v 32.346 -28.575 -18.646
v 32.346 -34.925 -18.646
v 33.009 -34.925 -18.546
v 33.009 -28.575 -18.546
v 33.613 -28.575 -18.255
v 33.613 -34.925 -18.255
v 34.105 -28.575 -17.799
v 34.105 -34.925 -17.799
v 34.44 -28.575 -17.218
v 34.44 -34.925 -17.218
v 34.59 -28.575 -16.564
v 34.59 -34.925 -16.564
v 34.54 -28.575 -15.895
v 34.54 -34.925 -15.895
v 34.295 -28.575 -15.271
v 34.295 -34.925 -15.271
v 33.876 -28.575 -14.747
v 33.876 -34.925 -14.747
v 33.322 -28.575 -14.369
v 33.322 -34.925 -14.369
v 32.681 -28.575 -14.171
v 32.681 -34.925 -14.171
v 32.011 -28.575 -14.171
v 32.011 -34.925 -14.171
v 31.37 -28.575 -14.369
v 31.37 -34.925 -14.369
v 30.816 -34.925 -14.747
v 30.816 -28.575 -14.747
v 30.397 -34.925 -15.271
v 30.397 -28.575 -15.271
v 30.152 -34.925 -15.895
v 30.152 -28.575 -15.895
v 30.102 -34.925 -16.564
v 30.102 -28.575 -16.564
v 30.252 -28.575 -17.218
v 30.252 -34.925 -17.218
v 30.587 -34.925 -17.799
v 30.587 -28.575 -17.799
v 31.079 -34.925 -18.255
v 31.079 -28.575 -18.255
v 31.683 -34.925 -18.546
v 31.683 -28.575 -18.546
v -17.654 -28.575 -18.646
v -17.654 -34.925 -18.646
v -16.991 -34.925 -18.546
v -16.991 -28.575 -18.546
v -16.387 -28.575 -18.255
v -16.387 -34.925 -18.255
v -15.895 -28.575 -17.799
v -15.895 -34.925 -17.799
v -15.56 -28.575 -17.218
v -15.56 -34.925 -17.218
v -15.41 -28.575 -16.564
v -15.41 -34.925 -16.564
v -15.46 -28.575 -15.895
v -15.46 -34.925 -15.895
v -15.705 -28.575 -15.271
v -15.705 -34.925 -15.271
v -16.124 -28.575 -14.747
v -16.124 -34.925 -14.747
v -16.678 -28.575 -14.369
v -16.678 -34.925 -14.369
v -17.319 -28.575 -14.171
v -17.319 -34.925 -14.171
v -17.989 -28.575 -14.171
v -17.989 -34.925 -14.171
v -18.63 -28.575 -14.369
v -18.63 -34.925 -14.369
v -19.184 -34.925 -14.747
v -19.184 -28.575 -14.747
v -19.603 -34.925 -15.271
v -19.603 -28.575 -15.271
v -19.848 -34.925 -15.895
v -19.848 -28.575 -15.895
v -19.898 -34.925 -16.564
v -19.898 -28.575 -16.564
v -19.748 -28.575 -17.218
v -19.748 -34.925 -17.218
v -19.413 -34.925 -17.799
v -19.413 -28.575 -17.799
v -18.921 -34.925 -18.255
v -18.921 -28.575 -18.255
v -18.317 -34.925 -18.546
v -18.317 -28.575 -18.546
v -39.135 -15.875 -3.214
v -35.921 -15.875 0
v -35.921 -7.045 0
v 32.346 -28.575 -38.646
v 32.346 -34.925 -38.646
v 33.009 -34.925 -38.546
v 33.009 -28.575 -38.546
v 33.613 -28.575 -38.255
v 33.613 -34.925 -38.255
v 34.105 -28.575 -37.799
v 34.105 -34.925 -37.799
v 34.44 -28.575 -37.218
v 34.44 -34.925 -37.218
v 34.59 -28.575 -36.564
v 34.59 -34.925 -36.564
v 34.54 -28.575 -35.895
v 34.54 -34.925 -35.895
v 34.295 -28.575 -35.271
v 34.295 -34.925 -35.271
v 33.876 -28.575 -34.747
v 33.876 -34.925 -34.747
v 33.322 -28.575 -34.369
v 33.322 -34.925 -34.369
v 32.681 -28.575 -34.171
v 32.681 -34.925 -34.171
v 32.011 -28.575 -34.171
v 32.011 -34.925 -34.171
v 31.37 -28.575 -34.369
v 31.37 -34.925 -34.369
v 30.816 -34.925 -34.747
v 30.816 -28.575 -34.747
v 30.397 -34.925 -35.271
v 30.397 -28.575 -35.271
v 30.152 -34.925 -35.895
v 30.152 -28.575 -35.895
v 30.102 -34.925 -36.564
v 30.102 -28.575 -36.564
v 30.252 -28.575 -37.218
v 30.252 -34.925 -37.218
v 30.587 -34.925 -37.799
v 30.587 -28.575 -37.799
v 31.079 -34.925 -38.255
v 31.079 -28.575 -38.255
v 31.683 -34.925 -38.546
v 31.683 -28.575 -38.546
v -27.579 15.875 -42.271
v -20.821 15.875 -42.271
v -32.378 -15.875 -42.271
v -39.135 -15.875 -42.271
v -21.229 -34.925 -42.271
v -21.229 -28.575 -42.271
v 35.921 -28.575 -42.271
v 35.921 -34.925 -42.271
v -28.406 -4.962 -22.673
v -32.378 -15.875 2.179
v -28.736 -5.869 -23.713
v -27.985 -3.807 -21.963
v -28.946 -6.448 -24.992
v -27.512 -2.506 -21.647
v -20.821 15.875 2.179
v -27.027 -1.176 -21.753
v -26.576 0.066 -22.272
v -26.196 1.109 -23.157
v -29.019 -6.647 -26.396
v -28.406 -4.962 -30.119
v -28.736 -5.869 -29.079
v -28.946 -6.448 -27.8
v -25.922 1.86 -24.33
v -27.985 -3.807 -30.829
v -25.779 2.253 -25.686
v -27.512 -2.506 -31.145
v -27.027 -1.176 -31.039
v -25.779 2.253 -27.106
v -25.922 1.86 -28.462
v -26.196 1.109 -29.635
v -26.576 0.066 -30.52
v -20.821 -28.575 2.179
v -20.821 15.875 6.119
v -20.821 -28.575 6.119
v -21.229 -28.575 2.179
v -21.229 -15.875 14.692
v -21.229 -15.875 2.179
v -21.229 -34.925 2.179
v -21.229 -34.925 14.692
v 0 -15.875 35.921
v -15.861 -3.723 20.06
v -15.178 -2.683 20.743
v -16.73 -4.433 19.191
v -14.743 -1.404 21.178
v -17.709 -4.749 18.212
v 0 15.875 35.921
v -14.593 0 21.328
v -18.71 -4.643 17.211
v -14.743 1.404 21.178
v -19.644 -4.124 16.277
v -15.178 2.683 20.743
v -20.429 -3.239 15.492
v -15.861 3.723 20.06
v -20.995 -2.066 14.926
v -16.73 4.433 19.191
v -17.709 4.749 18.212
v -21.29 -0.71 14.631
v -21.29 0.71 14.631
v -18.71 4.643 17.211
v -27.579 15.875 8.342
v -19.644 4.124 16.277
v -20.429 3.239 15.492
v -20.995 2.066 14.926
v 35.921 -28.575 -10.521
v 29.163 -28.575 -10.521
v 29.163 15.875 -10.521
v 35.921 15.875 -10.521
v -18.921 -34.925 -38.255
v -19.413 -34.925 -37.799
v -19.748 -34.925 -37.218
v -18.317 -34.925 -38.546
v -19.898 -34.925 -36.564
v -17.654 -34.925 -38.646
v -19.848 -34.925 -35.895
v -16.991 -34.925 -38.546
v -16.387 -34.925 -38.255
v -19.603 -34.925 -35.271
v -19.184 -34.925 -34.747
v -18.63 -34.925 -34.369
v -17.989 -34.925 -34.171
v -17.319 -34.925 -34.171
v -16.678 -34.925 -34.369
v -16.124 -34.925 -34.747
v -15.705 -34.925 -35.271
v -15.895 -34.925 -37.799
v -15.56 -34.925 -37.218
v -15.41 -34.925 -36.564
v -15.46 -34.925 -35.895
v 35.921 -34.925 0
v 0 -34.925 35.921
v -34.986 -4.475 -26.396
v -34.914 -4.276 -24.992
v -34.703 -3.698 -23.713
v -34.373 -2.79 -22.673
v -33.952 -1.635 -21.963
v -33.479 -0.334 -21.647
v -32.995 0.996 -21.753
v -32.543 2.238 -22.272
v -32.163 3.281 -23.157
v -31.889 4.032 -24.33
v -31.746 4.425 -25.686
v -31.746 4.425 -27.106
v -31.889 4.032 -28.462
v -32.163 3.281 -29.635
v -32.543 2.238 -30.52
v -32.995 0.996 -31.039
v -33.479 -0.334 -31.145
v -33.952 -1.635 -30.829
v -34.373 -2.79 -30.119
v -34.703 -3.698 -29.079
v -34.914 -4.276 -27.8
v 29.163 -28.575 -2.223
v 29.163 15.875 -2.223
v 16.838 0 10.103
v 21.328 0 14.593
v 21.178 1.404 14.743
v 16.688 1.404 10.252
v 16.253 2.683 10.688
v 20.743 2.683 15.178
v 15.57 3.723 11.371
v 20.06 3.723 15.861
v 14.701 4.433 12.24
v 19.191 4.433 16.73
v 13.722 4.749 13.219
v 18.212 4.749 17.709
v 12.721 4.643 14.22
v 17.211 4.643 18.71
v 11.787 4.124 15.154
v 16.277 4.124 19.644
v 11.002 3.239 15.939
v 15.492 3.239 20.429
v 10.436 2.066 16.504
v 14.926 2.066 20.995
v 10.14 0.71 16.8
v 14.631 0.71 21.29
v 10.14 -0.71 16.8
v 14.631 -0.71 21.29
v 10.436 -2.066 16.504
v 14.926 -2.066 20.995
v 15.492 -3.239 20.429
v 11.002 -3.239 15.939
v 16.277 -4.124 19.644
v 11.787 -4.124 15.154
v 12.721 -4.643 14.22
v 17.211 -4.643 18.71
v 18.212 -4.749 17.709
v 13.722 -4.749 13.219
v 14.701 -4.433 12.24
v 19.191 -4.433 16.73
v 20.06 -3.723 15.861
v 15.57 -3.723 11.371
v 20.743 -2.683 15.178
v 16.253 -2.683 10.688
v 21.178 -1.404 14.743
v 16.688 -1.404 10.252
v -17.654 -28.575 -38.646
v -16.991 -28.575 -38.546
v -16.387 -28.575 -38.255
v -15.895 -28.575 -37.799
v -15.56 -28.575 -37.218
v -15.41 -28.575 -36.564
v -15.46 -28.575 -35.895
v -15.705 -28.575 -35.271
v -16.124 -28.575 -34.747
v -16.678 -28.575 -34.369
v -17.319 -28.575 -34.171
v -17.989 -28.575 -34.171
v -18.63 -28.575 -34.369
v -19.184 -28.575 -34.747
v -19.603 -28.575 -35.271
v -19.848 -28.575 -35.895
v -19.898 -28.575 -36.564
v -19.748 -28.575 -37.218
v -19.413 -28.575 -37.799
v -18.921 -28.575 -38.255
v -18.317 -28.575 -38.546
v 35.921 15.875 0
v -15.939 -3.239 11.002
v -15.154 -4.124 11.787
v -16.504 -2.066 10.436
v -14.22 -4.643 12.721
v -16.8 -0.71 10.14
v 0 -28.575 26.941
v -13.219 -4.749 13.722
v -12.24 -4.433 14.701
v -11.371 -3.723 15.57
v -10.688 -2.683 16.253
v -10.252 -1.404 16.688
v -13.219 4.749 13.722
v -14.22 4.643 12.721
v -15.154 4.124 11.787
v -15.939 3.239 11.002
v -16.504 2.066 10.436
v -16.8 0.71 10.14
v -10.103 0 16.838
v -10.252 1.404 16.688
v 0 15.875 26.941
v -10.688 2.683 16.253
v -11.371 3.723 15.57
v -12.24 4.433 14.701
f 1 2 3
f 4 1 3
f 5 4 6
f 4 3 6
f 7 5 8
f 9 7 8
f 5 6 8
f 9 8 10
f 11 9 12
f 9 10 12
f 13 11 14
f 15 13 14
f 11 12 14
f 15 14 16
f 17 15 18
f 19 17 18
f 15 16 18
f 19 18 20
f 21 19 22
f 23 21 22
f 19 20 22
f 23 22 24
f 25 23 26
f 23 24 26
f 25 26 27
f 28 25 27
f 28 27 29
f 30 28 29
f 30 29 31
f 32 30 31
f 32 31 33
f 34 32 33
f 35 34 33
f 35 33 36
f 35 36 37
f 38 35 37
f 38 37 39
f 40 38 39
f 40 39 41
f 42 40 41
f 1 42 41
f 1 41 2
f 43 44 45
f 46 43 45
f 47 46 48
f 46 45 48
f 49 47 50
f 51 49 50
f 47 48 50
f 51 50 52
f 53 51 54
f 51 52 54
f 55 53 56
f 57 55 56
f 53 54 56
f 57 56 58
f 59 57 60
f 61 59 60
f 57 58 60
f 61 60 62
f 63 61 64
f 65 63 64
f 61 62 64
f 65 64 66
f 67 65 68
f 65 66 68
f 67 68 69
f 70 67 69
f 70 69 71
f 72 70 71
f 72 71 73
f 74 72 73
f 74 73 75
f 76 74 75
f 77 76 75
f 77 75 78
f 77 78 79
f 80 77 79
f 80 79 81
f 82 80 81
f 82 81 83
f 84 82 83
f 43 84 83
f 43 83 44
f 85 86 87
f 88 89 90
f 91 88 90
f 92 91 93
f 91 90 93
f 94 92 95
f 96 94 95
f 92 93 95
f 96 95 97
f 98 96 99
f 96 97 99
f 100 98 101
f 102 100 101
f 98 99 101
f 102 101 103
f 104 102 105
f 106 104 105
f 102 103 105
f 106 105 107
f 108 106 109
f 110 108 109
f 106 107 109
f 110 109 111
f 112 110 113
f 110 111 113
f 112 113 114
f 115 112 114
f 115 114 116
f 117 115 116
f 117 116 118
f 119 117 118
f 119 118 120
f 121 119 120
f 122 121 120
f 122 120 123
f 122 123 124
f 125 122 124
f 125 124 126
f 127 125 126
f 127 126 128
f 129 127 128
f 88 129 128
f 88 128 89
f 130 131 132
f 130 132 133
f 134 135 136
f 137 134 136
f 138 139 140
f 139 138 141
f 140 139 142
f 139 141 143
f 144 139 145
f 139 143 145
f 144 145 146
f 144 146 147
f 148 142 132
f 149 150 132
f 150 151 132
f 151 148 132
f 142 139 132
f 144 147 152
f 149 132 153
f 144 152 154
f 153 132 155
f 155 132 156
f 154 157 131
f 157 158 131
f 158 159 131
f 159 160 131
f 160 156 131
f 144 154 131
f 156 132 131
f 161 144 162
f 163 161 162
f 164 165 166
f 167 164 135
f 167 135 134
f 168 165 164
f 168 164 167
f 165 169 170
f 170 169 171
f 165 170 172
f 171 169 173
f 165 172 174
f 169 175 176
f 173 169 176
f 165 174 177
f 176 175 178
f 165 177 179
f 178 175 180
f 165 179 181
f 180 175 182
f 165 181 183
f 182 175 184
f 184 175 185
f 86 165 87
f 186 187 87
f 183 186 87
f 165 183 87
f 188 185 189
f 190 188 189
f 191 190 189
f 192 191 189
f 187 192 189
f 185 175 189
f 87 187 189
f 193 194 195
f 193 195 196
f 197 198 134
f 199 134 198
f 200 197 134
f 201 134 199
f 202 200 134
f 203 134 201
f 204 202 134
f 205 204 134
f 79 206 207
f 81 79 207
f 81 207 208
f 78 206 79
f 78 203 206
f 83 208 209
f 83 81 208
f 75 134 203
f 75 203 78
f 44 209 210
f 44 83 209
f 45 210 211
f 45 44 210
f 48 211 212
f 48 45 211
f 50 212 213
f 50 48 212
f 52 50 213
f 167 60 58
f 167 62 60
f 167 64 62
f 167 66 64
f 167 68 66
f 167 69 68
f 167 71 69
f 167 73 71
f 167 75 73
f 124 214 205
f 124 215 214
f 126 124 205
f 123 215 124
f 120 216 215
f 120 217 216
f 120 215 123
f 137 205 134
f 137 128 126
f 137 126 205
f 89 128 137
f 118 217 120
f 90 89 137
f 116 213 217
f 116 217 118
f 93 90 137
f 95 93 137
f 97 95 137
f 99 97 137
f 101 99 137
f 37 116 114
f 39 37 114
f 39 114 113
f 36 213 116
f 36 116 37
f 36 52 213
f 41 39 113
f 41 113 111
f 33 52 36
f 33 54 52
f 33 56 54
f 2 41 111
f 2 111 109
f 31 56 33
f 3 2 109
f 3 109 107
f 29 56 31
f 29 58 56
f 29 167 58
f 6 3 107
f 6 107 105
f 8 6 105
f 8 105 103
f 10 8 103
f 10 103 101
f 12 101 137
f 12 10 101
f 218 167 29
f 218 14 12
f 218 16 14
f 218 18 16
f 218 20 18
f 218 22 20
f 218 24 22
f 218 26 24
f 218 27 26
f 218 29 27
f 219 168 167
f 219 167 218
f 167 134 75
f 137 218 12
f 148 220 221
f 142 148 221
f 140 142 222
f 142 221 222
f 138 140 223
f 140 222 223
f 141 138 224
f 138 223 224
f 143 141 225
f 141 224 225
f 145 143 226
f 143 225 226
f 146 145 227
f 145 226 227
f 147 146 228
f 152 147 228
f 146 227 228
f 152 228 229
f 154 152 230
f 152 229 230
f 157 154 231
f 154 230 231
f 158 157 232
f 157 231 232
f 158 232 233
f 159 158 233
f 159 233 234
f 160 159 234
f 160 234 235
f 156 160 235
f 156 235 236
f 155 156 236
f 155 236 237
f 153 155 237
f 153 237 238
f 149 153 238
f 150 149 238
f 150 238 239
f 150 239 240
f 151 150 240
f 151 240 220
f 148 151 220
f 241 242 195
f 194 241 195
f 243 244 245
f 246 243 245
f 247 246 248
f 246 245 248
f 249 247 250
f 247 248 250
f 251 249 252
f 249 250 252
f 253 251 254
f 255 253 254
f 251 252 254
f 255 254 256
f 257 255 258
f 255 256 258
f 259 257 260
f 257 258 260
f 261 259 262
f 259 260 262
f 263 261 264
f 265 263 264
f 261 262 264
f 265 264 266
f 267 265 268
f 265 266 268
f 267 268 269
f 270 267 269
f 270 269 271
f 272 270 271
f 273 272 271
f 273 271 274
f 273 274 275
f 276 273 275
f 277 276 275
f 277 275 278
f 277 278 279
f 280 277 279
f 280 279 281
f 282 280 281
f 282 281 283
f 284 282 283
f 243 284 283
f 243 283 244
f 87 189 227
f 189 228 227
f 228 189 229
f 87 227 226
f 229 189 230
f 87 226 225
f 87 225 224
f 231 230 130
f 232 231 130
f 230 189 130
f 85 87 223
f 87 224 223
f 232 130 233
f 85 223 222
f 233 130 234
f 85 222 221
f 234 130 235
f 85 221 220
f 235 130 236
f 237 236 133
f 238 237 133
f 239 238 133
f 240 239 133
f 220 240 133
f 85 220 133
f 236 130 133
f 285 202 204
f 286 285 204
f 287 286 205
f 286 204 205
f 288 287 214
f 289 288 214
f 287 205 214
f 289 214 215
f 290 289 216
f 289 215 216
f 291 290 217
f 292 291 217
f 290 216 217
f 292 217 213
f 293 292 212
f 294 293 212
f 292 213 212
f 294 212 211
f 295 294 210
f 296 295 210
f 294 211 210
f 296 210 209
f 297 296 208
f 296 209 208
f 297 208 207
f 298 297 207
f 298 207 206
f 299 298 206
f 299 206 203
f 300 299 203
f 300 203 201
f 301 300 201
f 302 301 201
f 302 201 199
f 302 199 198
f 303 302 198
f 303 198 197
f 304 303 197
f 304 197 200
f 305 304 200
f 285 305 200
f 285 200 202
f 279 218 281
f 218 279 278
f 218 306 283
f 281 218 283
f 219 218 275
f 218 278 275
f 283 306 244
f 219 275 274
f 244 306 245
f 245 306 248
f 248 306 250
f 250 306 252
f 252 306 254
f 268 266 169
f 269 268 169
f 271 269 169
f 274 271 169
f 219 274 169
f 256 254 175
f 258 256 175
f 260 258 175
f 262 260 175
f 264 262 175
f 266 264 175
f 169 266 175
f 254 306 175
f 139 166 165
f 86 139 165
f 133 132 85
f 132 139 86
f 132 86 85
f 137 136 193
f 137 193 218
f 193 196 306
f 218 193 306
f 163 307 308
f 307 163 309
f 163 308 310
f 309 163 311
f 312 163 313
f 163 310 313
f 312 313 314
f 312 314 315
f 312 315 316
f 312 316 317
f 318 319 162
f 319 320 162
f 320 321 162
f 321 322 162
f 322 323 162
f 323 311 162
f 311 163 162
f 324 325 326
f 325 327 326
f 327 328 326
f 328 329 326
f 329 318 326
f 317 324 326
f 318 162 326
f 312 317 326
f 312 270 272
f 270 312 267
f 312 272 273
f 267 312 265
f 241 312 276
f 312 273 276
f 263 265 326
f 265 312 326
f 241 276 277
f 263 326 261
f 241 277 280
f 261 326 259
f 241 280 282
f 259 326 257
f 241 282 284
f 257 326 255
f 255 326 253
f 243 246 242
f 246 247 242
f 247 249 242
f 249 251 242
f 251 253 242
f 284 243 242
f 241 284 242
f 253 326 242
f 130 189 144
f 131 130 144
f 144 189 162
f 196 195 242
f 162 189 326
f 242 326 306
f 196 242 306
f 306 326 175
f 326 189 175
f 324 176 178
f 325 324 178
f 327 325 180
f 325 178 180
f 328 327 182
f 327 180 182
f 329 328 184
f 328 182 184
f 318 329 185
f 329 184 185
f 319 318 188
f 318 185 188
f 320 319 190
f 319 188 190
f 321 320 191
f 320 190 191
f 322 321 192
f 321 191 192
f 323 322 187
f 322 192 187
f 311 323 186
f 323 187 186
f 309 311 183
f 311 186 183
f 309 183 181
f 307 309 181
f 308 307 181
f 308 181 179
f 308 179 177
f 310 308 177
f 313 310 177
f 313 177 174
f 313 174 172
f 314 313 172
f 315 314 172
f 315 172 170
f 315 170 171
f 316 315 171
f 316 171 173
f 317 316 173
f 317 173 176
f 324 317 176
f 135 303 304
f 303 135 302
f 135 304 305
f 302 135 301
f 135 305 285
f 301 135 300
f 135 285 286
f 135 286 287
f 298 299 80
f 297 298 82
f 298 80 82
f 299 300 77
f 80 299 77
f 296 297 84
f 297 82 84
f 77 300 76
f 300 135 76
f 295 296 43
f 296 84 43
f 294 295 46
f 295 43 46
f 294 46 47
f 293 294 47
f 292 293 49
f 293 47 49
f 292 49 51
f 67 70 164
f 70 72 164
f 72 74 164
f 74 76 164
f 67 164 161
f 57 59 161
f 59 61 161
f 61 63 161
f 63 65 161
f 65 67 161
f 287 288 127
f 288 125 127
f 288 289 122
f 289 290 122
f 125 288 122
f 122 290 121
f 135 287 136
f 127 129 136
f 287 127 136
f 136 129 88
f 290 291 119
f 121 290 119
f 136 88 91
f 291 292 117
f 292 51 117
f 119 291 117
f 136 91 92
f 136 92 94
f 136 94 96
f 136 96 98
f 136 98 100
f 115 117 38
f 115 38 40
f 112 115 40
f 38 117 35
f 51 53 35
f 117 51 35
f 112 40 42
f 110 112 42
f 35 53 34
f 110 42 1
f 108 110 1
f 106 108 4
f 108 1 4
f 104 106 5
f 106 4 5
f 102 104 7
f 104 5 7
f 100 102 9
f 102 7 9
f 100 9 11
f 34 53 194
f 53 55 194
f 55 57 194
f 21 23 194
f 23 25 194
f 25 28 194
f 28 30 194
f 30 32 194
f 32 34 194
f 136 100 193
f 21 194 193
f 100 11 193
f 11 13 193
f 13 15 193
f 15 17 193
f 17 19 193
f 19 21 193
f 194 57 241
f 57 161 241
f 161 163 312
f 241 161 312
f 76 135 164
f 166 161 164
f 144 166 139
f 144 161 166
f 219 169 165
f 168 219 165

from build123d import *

# Parameters (mm, degrees)
BOSS_EXTRUDE1_DEPTH             = 15.875
SKETCH2_R                       = 4.7625
CUT_EXTRUDE1_DEPTH              = 8
SKETCH3_R                       = 4.7625
CUT_EXTRUDE2_DEPTH              = 8
CUT_EXTRUDE3_DEPTH              = 60.905780189
BOSS_EXTRUDE2_REACH             = 62.821
BOSS_EXTRUDE2_DIRECTION_2_DEPTH = 31.75
SKETCH6_R                       = 4.7625
CUT_EXTRUDE4_DEPTH              = 83.269033521
CUT_EXTRUDE5_DEPTH              = 31.75
BOSS_EXTRUDE4_DEPTH             = 31.75
CUT_EXTRUDE6_DEPTH              = 93.319424063
BOSS_EXTRUDE5_DEPTH             = 12.7
BOSS_EXTRUDE6_DEPTH             = 6.35
CUT_EXTRUDE7_DEPTH              = 71.05833388
CUT_EXTRUDE8_REACH              = 78.805
SKETCH15_R                      = 2.25
CUT_EXTRUDE9_DEPTH              = 44.45
CUT_EXTRUDE10_DEPTH             = 12.7
SKETCH21_W                      = 12.513073453
SKETCH21_H                      = 19.05
CUT_EXTRUDE11_DEPTH             = 69.753972493


with BuildPart() as part:
    # Sketch1 → Boss-Extrude1 (new, symmetric)
    with BuildSketch(Plane(origin=(0, 0, 0), x_dir=(1, 0, 0), z_dir=(0, 1, 0))):
        Polygon((-35.921024484, 0), (0, 35.921024484), (35.921024484, 0), (0, -35.921024484), align=None)
    extrude(amount=BOSS_EXTRUDE1_DEPTH, both=True)

    # Sketch2 → Cut-Extrude1 (cut)
    with BuildSketch(Plane(origin=(17.960512242, 0, 17.960512242), x_dir=(0.7071067811865476, 0, -0.7071067811865476), z_dir=(0.7071067811865476, 0, 0.7071067811865476))):
        Circle(SKETCH2_R)
    extrude(amount=-CUT_EXTRUDE1_DEPTH, mode=Mode.SUBTRACT)

    # Sketch3 → Cut-Extrude2 (cut)
    with BuildSketch(Plane(origin=(-17.960512242, 0, 17.960512242), x_dir=(0.7071067811865472, 0, 0.7071067811865478), z_dir=(-0.7071067811865478, 0, 0.7071067811865472))):
        Circle(SKETCH3_R)
    extrude(amount=-CUT_EXTRUDE2_DEPTH, mode=Mode.SUBTRACT)

    # Sketch4 → Cut-Extrude3 (cut, through all)
    with BuildSketch(Plane(origin=(0, 15.875, 0), x_dir=(1, 0, 0), z_dir=(0, 1, 0))):
        Polygon((25.4, 10.521024484), (-25.4, 10.521024484), (0, 35.921024484), align=None)
    extrude(amount=-CUT_EXTRUDE3_DEPTH, mode=Mode.SUBTRACT)

    # Boss-Extrude2: up to this face of the body (flat: up to its plane)
    boss_extrude2_end = Plane(part.part.faces().sort_by_distance((30.660512242, 0, -5.260512242))[0])
    # Sketch5 → Boss-Extrude2 (add, up to the picked face)
    with BuildSketch(Plane(origin=(0, 0, -10.521024484), x_dir=(-1, 0, 0), z_dir=(0, 0, -1)), mode=Mode.PRIVATE) as boss_extrude2_sk1:
        Polygon((-35.921024484, 15.875), (-35.921024484, -15.875), (39.135030454, -15.875), (27.578975516, 15.875), align=None)
    boss_extrude2_tool1 = split(extrude(boss_extrude2_sk1.sketch, amount=-BOSS_EXTRUDE2_REACH, mode=Mode.PRIVATE), bisect_by=boss_extrude2_end, keep=Keep.BOTH, mode=Mode.PRIVATE)
    add(boss_extrude2_tool1.solids().sort_by(Axis((1.201693, -0.441343, -10.521024), (0, 0, 1)))[0])

    # Sketch5 → Boss-Extrude2 direction 2 (add)
    with BuildSketch(Plane(origin=(0, 0, -10.521024484), x_dir=(-1, 0, 0), z_dir=(0, 0, -1))):
        Polygon((-35.921024484, 15.875), (-35.921024484, -15.875), (39.135030454, -15.875), (27.578975516, 15.875), align=None)
    extrude(amount=BOSS_EXTRUDE2_DIRECTION_2_DEPTH)

    # Sketch6 → Cut-Extrude4 (cut, through all)
    with BuildSketch(Plane(origin=(-29.45497488, 10.720734107, 0), x_dir=(0, 0, 1), z_dir=(-0.9396926207859072, 0.3420201433256724, 0))):
        with Locations(Location((-26.396024484, -11.408766942, 0), (0, 0, 270))):
            Circle(SKETCH6_R)
    extrude(amount=-CUT_EXTRUDE4_DEPTH, mode=Mode.SUBTRACT)

    # Sketch7 → Cut-Extrude5 (cut)
    with BuildSketch(Plane(origin=(0, 0, -42.271024484), x_dir=(-1, 0, 0), z_dir=(0, 0, -1))):
        Polygon((20.821446661, 15.875), (32.377501598, -15.875), (-35.921024484, -15.875), (-35.921024484, 15.875), align=None)
    extrude(amount=-CUT_EXTRUDE5_DEPTH, mode=Mode.SUBTRACT)

    # Sketch9 → Boss-Extrude4 (add)
    with BuildSketch(Plane.XZ.offset(15.875)):
        Polygon((-25.4, -10.521024484), (-35.921024484, 0), (-46.442048969, -10.521024484), align=None)
    extrude(amount=-BOSS_EXTRUDE4_DEPTH)

    # Sketch10 → Cut-Extrude6 (cut, through all)
    with BuildSketch(Plane(origin=(0, 0, -42.271024484), x_dir=(-1, 0, 0), z_dir=(0, 0, -1))):
        Polygon((46.442048969, -15.875), (46.442048969, 15.875), (27.578975516, 15.875), (39.135030454, -15.875), align=None)
    extrude(amount=-CUT_EXTRUDE6_DEPTH, mode=Mode.SUBTRACT)

    # Sketch11 → Boss-Extrude5 (add)
    with BuildSketch(Plane.XZ.offset(15.875)):
        Polygon((-32.377501598, -10.521024484), (-39.135030454, -10.521024484), (-39.135030454, -3.214005969), (0, 35.921024484), (35.921024484, 0), (35.921024484, -10.521024484), align=None)
    extrude(amount=BOSS_EXTRUDE5_DEPTH)

    # Sketch12 → Boss-Extrude6 (add)
    with BuildSketch(Plane.XZ.offset(28.575)):
        Polygon((35.921024484, -10.521024484), (35.921024484, 0), (0, 35.921024484), (-39.135030454, -3.214005969), (-39.135030454, -42.271024484), (35.921024484, -42.271024484), align=None)
    extrude(amount=BOSS_EXTRUDE6_DEPTH)

    # Sketch14 → Cut-Extrude7 (cut, through all)
    with BuildSketch(Plane(origin=(0, 0, -10.521024484), x_dir=(-1, 0, 0), z_dir=(0, 0, -1))):
        Polygon((36.999923574, -28.575), (20.821446661, 15.875), (5.050498603, 15.875), (21.228975516, -28.575), (21.228975516, -34.925), (39.135030454, -34.925), (39.135030454, -28.575), align=None)
    extrude(amount=CUT_EXTRUDE7_DEPTH, mode=Mode.SUBTRACT)

    # Sketch15 → Cut-Extrude8 (cut, up to next)
    with BuildSketch(Plane.XZ.offset(34.925), mode=Mode.PRIVATE) as cut_extrude8_sk1:
        with Locations(Location((32.346024484, -36.396024484, 0), (0, 0, 270))):
            Circle(SKETCH15_R)
    cut_extrude8_tool1 = extrude(cut_extrude8_sk1.sketch, amount=-CUT_EXTRUDE8_REACH, mode=Mode.PRIVATE) & part.part
    # Sketch15 → Cut-Extrude8 (cut, up to next)
    with BuildSketch(Plane.XZ.offset(34.925), mode=Mode.PRIVATE) as cut_extrude8_sk2:
        with Locations(Location((32.346024484, -16.396024484, 0), (0, 0, 270))):
            Circle(SKETCH15_R)
    cut_extrude8_tool2 = extrude(cut_extrude8_sk2.sketch, amount=-CUT_EXTRUDE8_REACH, mode=Mode.PRIVATE) & part.part
    # Sketch15 → Cut-Extrude8 (cut, up to next)
    with BuildSketch(Plane.XZ.offset(34.925), mode=Mode.PRIVATE) as cut_extrude8_sk3:
        with Locations(Location((-17.653975516, -16.396024484, 0), (0, 0, 270))):
            Circle(SKETCH15_R)
    cut_extrude8_tool3 = extrude(cut_extrude8_sk3.sketch, amount=-CUT_EXTRUDE8_REACH, mode=Mode.PRIVATE) & part.part
    # Sketch15 → Cut-Extrude8 (cut, up to next)
    with BuildSketch(Plane.XZ.offset(34.925), mode=Mode.PRIVATE) as cut_extrude8_sk4:
        with Locations(Location((-17.653975516, -36.396024484, 0), (0, 0, 270))):
            Circle(SKETCH15_R)
    cut_extrude8_tool4 = extrude(cut_extrude8_sk4.sketch, amount=-CUT_EXTRUDE8_REACH, mode=Mode.PRIVATE) & part.part
    add(cut_extrude8_tool1.solids().sort_by_distance((32.346024, -34.925, -36.396024))[0], mode=Mode.SUBTRACT)
    add(cut_extrude8_tool2.solids().sort_by_distance((32.346024, -34.925, -16.396024))[0], mode=Mode.SUBTRACT)
    add(cut_extrude8_tool3.solids().sort_by_distance((-17.653976, -34.925, -16.396024))[0], mode=Mode.SUBTRACT)
    add(cut_extrude8_tool4.solids().sort_by_distance((-17.653976, -34.925, -36.396024))[0], mode=Mode.SUBTRACT)

    # Sketch17 → Cut-Extrude9 (cut)
    with BuildSketch(Plane(origin=(0, 15.875, 0), x_dir=(1, 0, 0), z_dir=(0, 1, 0))):
        Polygon((-20.821446661, 10.521024484), (-20.821446661, -6.119321703), (0, -26.940768363), (29.163495629, 2.222727266), (29.163495629, 10.521024484), align=None)
    extrude(amount=-CUT_EXTRUDE9_DEPTH, mode=Mode.SUBTRACT)

    # Sketch20 → Cut-Extrude10 (cut)
    with BuildSketch(Plane(origin=(0, 0, -10.521024484), x_dir=(-1, 0, 0), z_dir=(0, 0, -1))):
        Polygon((21.228975516, -28.575), (21.228975516, -34.925), (39.135030454, -34.925), (39.135030454, -15.875), (32.377501598, -15.875), (20.821446661, 15.875), (20.821446661, -28.575), align=None)
    extrude(amount=-CUT_EXTRUDE10_DEPTH, mode=Mode.SUBTRACT)

    # Sketch21 → Cut-Extrude11 (cut, through all)
    with BuildSketch(Plane(origin=(0, 0, 2.178975516), x_dir=(-1, 0, 0), z_dir=(0, 0, -1))):
        with Locations((27.485512243, -25.4)):
            Rectangle(SKETCH21_W, SKETCH21_H)
    extrude(amount=-CUT_EXTRUDE11_DEPTH, mode=Mode.SUBTRACT)


solid = part.part
